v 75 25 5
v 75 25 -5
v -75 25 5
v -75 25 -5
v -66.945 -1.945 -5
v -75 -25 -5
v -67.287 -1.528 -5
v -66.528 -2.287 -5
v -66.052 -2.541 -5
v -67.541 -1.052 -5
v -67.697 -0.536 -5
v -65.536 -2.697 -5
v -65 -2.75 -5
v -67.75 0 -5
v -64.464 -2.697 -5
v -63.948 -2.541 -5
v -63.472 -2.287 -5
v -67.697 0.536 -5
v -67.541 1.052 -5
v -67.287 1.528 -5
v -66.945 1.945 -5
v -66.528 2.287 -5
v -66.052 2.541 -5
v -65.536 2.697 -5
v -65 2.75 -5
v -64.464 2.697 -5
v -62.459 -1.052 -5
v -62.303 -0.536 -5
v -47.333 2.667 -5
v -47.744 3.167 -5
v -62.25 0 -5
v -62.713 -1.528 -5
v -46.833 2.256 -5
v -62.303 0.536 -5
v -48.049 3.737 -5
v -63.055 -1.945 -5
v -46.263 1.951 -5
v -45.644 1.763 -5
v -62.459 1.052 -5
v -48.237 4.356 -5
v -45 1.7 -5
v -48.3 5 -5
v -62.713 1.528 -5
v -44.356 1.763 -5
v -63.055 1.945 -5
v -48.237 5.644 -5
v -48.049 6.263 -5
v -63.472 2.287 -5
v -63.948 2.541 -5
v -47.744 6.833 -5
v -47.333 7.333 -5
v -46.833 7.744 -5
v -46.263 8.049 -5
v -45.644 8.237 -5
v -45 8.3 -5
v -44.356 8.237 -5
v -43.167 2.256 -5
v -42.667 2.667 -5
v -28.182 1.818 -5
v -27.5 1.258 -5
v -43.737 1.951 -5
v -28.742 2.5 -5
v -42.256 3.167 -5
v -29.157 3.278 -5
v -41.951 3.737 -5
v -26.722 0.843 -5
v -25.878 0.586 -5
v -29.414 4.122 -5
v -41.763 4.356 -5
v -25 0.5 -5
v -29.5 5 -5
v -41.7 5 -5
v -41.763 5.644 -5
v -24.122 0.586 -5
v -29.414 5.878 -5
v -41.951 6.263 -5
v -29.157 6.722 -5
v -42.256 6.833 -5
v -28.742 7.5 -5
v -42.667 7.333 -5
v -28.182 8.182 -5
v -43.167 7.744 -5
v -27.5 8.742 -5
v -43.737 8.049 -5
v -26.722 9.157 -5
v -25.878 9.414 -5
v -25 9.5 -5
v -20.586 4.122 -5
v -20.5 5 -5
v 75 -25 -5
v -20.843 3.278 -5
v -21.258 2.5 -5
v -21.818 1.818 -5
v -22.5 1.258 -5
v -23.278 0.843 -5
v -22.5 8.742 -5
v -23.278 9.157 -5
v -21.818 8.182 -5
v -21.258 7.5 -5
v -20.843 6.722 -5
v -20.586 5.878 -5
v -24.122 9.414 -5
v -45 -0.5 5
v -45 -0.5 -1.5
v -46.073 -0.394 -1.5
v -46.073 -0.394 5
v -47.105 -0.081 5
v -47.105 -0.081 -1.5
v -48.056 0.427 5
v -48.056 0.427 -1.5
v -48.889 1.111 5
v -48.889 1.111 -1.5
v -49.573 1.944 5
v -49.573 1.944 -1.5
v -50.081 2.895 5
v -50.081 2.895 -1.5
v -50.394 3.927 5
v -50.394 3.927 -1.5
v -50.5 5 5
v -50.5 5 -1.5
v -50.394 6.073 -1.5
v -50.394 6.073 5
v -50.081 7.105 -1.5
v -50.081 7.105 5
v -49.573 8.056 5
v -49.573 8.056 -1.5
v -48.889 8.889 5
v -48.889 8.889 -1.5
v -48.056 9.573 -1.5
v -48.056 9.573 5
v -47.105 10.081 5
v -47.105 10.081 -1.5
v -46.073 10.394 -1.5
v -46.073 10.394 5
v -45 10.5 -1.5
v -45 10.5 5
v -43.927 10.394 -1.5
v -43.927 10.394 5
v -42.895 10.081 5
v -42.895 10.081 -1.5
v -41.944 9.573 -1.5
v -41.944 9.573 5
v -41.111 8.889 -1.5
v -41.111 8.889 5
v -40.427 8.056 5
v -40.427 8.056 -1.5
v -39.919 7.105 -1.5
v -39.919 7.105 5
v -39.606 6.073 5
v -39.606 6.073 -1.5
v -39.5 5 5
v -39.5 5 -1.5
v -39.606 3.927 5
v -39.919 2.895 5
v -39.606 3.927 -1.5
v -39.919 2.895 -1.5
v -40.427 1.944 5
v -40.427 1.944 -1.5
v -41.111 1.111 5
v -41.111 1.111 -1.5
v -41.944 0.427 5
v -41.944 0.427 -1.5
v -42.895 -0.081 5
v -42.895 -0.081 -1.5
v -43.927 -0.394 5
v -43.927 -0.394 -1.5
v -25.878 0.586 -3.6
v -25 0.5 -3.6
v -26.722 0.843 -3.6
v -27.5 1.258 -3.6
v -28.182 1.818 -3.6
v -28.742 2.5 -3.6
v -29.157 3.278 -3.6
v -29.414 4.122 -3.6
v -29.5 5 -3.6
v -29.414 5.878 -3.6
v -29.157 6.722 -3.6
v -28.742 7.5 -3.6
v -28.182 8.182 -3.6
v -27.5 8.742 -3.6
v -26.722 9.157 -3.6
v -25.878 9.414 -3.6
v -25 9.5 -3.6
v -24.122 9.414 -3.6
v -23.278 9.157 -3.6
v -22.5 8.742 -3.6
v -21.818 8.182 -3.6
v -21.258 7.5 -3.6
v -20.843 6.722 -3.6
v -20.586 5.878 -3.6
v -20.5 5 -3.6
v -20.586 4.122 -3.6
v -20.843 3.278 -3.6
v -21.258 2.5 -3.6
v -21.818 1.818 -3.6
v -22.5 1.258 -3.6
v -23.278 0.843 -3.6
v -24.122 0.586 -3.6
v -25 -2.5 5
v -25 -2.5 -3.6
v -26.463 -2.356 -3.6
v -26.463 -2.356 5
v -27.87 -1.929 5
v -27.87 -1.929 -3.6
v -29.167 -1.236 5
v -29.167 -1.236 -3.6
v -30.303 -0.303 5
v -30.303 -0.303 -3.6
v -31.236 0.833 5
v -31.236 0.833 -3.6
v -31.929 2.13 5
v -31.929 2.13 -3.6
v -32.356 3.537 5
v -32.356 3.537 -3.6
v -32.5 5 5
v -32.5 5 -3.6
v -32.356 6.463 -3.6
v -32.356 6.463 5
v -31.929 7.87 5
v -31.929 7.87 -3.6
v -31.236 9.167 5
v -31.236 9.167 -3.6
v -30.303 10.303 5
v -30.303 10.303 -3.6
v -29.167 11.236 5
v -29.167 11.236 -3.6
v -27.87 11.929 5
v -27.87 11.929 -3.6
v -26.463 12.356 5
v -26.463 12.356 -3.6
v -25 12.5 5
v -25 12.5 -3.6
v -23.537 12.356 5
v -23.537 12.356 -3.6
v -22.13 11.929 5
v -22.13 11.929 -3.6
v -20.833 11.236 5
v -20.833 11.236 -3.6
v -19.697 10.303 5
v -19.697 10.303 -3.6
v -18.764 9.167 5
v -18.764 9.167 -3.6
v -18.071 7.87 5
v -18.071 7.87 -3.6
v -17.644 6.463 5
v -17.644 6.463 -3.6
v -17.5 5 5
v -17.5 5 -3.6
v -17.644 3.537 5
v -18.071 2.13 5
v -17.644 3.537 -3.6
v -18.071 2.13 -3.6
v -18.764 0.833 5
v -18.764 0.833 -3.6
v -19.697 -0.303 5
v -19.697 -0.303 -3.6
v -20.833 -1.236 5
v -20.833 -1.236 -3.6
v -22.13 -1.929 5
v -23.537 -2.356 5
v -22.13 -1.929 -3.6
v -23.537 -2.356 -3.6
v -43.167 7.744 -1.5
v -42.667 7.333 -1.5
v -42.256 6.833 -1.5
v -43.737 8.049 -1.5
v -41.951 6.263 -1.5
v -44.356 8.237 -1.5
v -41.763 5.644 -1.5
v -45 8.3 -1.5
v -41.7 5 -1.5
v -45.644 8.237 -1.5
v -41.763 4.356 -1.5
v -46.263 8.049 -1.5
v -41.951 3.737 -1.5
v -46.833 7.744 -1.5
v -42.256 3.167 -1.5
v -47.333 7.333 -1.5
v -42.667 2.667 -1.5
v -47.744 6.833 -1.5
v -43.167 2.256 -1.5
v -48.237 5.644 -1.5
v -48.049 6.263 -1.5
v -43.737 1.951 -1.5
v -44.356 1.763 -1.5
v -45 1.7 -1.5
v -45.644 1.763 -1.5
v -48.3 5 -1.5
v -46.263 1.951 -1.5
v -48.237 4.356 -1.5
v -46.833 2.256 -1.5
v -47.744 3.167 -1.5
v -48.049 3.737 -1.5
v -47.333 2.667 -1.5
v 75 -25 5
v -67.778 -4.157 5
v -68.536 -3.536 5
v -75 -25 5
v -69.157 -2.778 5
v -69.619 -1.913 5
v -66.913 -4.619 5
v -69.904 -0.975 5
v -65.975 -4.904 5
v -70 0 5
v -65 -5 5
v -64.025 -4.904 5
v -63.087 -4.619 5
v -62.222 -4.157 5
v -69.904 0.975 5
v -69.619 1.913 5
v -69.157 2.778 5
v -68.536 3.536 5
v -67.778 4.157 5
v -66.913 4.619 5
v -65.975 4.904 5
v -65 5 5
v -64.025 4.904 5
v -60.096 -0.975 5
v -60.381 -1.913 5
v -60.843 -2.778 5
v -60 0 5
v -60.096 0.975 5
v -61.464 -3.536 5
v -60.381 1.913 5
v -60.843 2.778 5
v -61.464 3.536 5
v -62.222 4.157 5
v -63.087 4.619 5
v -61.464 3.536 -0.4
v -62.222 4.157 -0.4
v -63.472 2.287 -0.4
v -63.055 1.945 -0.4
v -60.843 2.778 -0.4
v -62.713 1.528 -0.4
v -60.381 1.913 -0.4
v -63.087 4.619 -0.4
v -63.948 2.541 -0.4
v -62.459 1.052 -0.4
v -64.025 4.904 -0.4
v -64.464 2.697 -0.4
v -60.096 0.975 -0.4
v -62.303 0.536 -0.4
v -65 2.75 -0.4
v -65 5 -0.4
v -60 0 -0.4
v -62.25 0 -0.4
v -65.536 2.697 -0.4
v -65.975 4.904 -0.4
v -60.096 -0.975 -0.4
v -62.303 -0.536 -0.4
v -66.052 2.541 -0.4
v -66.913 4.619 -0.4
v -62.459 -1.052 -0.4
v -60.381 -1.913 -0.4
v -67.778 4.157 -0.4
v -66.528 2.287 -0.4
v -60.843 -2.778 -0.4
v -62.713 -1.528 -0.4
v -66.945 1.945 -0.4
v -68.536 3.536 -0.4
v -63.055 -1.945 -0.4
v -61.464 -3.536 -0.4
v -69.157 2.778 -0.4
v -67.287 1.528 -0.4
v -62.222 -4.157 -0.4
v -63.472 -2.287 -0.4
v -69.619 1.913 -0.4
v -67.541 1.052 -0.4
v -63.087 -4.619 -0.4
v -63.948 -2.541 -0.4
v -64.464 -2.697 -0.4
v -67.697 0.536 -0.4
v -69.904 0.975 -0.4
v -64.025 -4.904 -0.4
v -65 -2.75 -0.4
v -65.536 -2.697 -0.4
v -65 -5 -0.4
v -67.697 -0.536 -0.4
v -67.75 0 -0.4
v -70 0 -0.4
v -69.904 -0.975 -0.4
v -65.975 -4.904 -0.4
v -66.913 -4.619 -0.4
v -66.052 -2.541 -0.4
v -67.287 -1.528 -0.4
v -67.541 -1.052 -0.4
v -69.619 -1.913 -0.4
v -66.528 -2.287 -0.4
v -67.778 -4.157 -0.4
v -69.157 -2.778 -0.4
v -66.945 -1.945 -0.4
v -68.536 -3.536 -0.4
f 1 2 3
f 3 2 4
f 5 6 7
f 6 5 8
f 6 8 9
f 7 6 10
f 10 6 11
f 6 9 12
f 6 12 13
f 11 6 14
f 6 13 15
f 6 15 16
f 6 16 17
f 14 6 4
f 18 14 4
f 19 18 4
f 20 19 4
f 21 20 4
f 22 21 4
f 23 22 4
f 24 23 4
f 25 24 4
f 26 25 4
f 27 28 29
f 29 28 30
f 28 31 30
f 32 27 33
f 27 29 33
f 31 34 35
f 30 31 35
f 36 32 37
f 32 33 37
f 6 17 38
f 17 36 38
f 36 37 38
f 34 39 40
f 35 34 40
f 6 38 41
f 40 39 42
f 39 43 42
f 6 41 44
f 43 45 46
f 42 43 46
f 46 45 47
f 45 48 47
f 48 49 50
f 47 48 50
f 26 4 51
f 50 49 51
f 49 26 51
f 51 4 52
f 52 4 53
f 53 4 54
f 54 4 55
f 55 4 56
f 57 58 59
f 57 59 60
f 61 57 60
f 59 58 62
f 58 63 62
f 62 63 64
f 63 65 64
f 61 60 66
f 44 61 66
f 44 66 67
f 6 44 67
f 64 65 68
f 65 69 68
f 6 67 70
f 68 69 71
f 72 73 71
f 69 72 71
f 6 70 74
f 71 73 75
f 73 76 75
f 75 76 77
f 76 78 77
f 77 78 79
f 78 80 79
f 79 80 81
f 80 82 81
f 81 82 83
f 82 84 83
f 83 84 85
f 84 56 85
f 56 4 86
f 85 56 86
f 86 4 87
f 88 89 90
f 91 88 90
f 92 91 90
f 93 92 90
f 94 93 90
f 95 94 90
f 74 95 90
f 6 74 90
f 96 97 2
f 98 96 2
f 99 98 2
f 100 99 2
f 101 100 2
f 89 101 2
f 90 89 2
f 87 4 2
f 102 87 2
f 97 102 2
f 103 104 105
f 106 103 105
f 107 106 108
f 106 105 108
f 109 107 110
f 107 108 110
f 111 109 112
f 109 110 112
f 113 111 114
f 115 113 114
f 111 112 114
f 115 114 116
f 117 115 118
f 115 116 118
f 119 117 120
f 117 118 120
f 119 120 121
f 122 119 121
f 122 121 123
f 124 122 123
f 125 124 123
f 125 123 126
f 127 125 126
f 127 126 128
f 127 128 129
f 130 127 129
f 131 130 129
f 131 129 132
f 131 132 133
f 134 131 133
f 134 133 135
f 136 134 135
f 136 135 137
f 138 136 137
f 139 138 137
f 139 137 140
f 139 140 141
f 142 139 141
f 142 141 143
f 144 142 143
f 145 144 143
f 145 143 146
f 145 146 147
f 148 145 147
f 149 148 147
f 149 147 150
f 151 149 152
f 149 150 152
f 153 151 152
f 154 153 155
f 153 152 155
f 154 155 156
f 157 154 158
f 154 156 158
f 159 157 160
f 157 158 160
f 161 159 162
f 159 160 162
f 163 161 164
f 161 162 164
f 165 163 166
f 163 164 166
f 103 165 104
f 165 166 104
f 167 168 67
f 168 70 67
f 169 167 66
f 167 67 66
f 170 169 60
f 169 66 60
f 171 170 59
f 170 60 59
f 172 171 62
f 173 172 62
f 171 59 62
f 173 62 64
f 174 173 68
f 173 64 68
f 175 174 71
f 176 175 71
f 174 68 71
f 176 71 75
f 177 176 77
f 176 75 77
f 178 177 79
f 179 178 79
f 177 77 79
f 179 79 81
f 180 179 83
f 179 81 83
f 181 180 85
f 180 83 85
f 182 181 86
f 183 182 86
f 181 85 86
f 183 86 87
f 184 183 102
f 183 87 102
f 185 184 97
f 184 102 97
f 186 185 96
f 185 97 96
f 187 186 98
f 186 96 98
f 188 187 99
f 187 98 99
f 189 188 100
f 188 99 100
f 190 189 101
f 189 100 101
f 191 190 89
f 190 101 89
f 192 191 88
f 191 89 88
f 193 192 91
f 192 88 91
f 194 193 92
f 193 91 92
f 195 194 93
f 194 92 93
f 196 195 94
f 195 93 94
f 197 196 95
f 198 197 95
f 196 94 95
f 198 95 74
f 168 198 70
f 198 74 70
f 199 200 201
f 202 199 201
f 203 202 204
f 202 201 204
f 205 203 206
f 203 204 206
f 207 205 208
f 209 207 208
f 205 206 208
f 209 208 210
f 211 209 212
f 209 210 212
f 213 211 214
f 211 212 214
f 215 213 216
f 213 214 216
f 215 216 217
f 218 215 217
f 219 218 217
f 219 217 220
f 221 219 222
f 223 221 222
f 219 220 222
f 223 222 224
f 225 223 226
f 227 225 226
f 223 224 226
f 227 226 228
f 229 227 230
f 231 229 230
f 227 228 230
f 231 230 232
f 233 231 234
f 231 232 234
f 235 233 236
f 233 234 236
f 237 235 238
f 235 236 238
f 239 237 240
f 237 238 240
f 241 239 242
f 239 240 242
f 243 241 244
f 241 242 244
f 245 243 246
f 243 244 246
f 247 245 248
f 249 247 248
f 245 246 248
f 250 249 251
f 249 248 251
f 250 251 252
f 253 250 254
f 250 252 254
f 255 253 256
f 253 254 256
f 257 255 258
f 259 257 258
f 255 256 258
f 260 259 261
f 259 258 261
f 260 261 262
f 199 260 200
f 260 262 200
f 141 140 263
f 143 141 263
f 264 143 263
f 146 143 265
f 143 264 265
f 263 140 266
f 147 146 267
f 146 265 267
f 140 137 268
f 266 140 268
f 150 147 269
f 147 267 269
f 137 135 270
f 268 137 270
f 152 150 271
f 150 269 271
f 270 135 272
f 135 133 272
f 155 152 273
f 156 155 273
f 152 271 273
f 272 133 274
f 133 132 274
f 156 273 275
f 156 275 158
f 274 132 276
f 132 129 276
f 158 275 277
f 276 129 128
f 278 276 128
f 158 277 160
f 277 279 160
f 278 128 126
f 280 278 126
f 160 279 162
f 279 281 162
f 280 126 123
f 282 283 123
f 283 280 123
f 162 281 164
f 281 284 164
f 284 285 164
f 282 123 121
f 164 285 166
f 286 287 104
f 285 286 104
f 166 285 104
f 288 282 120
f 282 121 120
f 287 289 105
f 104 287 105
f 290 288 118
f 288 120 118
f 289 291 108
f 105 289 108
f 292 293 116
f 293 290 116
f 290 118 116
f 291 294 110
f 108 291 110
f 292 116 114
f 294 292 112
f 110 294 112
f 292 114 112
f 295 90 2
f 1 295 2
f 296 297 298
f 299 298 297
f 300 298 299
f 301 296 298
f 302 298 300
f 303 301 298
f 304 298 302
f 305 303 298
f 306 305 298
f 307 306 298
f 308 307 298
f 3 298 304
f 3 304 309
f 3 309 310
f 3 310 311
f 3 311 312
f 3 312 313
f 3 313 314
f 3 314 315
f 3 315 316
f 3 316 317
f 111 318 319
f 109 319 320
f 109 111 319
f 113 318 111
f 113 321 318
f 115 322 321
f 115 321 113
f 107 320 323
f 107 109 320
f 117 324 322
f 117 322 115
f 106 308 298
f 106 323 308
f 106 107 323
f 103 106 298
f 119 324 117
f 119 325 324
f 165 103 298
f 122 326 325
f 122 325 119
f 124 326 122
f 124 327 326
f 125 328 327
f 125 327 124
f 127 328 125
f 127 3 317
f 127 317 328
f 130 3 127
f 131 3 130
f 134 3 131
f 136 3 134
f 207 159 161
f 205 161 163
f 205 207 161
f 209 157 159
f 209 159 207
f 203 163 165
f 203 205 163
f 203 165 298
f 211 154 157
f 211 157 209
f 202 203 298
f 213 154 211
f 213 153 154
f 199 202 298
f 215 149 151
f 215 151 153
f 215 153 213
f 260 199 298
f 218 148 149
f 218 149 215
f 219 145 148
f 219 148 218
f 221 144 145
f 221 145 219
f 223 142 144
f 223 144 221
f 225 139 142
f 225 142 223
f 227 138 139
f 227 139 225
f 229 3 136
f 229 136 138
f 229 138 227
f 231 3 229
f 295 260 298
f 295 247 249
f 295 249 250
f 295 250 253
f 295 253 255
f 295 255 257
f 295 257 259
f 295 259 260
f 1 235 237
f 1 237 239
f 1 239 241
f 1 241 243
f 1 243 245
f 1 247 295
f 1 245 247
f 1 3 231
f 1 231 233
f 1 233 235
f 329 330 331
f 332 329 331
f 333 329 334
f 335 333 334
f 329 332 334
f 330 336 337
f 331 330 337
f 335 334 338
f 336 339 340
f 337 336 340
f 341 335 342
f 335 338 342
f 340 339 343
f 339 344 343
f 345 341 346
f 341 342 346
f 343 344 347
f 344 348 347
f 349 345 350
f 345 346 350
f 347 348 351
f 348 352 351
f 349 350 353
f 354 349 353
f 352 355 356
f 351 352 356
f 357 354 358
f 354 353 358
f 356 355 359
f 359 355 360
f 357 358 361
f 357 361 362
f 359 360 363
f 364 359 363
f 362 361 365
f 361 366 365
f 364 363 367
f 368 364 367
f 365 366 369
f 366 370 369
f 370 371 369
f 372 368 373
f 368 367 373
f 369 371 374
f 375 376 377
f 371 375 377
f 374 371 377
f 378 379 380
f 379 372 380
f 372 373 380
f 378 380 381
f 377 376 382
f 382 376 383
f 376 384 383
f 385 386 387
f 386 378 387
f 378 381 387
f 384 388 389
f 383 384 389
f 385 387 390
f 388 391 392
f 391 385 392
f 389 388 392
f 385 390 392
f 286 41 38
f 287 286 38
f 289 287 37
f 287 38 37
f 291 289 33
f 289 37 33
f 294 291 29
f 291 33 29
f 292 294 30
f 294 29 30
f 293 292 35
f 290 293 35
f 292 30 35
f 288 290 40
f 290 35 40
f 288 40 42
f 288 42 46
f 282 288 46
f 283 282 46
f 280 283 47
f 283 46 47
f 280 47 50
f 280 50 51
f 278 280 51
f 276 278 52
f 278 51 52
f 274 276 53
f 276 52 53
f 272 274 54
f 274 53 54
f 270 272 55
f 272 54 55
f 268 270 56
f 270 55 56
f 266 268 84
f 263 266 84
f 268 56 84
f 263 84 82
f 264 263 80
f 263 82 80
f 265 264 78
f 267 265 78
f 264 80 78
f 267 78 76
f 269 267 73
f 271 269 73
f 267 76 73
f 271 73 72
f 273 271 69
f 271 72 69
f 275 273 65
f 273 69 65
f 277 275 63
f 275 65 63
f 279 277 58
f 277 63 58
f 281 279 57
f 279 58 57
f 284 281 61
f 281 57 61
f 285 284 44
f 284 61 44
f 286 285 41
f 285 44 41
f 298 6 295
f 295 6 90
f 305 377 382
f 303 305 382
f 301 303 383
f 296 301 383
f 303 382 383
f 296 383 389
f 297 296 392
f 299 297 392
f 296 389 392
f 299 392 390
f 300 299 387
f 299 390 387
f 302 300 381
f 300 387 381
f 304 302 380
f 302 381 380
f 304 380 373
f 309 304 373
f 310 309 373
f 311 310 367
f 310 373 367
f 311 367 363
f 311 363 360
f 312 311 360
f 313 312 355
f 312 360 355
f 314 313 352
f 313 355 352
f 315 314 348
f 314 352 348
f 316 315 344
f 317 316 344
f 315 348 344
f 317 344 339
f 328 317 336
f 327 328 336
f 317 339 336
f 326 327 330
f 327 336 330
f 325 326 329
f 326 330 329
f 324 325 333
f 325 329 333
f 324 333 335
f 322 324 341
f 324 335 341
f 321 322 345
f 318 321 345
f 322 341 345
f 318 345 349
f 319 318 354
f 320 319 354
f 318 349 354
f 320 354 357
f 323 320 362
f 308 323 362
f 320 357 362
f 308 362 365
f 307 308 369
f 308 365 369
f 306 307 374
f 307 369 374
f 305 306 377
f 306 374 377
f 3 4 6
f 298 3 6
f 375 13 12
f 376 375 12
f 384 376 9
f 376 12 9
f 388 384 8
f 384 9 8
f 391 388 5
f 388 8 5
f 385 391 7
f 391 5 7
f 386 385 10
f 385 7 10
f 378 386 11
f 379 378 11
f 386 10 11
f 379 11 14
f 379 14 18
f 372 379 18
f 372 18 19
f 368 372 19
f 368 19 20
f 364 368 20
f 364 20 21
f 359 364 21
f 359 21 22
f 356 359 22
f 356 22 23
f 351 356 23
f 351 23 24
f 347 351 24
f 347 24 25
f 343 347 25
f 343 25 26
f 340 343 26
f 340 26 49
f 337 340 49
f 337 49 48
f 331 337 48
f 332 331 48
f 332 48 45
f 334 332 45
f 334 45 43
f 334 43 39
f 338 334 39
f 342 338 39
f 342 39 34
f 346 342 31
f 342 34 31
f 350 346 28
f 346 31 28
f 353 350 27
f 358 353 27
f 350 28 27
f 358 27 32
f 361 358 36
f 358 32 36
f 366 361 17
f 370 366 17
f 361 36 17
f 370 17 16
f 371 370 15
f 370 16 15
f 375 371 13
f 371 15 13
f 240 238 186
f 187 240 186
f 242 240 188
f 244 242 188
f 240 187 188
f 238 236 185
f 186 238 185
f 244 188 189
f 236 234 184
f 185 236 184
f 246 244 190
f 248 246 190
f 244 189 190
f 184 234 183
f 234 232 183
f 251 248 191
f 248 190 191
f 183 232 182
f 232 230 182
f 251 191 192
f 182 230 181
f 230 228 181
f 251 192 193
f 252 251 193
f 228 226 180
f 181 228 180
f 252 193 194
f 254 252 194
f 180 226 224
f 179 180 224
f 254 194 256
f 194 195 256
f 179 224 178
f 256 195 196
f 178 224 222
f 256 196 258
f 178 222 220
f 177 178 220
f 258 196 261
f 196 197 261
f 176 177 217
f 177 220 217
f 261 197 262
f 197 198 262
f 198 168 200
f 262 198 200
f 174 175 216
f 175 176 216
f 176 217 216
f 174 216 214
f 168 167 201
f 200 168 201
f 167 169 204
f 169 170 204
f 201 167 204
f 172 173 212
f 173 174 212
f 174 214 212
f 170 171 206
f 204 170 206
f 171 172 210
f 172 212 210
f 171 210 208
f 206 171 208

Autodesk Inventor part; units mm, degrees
ref_plane "YZ Plane" through (0, 0, 0) normal (1, 0, 0) x (0, 1, 0)
ref_plane "XZ Plane" through (0, 0, 0) normal (0, 1, 0) x (-1, 0, 0)
ref_plane "XY Plane" through (0, 0, 0) normal (0, 0, 1) x (1, 0, 0)
sketch "Sketch2" plane through (0, 0, 0) normal (0, 0, 1) x (1, 0, 0)
  line L0 (-75, -25) -> (75, -25)
  line L1 (75, -25) -> (75, 25)
  line L2 (75, 25) -> (-75, 25)
  line L3 (-75, 25) -> (-75, -25)
  line L4 (-75, -25) -> (75, 25) construction
  line L5 (75, -25) -> (-75, 25) construction
  point P0 (0, 0)
  dimension "d1" = 150
  dimension "d2" = 50
extrude "Extrusion1" add sketch "Sketch2" along normal mid plane 10
sketch "Sketch3" plane through (0, 0, 5) normal (0, 0, 1) x (1, 0, 0)
  line L0 (-75, 25) -> (-75, -25) projected
  line L1 (75, 25) -> (-75, 25) projected
  point P0 (0, 0)
  point P1 (-65, 0)
  dimension "d40" = 10
  dimension "d43" = 25
hole "Hole1" at (-65, 0, 5) direction (0, 0, -1) diameter 5.5 depth 14.2 tip angle 118 counterbore diameter 10 counterbore depth 5.4 clearance for "Socket Head Cap Screw" size "M5" standard "TS Profile"
sketch "Sketch4" plane through (0, 0, 5) normal (0, 0, 1) x (1, 0, 0)
  line L0 (-75, 25) -> (-75, -25) projected
  line L1 (75, 25) -> (-75, 25) projected
  point P0 (0, 0)
  point P1 (-45, 5)
  dimension "d41" = 30
  dimension "d42" = 20
hole "Hole2" at (-45, 5, 5) direction (0, 0, -1) diameter 6.6 depth 14.2 tip angle 118 counterbore diameter 11 counterbore depth 6.5 clearance for "Socket Head Cap Screw" size "M6" standard "TS Profile"
sketch "Sketch5" plane through (0, 0, 5) normal (0, 0, 1) x (1, 0, 0)
  line L0 (-75, 25) -> (-75, -25) projected
  line L1 (75, 25) -> (-75, 25) projected
  point P0 (0, 0)
  point P1 (-25, 5)
  dimension "d44" = 50
  dimension "d45" = 20
hole "Hole3" at (-25, 5, 5) direction (0, 0, -1) diameter 9 depth 14.2 tip angle 118 counterbore diameter 15 counterbore depth 8.6 clearance for "Socket Head Cap Screw" size "M8" standard "TS Profile"
properties part number "홀간 거리 확인 파트-6" material "SS400"
